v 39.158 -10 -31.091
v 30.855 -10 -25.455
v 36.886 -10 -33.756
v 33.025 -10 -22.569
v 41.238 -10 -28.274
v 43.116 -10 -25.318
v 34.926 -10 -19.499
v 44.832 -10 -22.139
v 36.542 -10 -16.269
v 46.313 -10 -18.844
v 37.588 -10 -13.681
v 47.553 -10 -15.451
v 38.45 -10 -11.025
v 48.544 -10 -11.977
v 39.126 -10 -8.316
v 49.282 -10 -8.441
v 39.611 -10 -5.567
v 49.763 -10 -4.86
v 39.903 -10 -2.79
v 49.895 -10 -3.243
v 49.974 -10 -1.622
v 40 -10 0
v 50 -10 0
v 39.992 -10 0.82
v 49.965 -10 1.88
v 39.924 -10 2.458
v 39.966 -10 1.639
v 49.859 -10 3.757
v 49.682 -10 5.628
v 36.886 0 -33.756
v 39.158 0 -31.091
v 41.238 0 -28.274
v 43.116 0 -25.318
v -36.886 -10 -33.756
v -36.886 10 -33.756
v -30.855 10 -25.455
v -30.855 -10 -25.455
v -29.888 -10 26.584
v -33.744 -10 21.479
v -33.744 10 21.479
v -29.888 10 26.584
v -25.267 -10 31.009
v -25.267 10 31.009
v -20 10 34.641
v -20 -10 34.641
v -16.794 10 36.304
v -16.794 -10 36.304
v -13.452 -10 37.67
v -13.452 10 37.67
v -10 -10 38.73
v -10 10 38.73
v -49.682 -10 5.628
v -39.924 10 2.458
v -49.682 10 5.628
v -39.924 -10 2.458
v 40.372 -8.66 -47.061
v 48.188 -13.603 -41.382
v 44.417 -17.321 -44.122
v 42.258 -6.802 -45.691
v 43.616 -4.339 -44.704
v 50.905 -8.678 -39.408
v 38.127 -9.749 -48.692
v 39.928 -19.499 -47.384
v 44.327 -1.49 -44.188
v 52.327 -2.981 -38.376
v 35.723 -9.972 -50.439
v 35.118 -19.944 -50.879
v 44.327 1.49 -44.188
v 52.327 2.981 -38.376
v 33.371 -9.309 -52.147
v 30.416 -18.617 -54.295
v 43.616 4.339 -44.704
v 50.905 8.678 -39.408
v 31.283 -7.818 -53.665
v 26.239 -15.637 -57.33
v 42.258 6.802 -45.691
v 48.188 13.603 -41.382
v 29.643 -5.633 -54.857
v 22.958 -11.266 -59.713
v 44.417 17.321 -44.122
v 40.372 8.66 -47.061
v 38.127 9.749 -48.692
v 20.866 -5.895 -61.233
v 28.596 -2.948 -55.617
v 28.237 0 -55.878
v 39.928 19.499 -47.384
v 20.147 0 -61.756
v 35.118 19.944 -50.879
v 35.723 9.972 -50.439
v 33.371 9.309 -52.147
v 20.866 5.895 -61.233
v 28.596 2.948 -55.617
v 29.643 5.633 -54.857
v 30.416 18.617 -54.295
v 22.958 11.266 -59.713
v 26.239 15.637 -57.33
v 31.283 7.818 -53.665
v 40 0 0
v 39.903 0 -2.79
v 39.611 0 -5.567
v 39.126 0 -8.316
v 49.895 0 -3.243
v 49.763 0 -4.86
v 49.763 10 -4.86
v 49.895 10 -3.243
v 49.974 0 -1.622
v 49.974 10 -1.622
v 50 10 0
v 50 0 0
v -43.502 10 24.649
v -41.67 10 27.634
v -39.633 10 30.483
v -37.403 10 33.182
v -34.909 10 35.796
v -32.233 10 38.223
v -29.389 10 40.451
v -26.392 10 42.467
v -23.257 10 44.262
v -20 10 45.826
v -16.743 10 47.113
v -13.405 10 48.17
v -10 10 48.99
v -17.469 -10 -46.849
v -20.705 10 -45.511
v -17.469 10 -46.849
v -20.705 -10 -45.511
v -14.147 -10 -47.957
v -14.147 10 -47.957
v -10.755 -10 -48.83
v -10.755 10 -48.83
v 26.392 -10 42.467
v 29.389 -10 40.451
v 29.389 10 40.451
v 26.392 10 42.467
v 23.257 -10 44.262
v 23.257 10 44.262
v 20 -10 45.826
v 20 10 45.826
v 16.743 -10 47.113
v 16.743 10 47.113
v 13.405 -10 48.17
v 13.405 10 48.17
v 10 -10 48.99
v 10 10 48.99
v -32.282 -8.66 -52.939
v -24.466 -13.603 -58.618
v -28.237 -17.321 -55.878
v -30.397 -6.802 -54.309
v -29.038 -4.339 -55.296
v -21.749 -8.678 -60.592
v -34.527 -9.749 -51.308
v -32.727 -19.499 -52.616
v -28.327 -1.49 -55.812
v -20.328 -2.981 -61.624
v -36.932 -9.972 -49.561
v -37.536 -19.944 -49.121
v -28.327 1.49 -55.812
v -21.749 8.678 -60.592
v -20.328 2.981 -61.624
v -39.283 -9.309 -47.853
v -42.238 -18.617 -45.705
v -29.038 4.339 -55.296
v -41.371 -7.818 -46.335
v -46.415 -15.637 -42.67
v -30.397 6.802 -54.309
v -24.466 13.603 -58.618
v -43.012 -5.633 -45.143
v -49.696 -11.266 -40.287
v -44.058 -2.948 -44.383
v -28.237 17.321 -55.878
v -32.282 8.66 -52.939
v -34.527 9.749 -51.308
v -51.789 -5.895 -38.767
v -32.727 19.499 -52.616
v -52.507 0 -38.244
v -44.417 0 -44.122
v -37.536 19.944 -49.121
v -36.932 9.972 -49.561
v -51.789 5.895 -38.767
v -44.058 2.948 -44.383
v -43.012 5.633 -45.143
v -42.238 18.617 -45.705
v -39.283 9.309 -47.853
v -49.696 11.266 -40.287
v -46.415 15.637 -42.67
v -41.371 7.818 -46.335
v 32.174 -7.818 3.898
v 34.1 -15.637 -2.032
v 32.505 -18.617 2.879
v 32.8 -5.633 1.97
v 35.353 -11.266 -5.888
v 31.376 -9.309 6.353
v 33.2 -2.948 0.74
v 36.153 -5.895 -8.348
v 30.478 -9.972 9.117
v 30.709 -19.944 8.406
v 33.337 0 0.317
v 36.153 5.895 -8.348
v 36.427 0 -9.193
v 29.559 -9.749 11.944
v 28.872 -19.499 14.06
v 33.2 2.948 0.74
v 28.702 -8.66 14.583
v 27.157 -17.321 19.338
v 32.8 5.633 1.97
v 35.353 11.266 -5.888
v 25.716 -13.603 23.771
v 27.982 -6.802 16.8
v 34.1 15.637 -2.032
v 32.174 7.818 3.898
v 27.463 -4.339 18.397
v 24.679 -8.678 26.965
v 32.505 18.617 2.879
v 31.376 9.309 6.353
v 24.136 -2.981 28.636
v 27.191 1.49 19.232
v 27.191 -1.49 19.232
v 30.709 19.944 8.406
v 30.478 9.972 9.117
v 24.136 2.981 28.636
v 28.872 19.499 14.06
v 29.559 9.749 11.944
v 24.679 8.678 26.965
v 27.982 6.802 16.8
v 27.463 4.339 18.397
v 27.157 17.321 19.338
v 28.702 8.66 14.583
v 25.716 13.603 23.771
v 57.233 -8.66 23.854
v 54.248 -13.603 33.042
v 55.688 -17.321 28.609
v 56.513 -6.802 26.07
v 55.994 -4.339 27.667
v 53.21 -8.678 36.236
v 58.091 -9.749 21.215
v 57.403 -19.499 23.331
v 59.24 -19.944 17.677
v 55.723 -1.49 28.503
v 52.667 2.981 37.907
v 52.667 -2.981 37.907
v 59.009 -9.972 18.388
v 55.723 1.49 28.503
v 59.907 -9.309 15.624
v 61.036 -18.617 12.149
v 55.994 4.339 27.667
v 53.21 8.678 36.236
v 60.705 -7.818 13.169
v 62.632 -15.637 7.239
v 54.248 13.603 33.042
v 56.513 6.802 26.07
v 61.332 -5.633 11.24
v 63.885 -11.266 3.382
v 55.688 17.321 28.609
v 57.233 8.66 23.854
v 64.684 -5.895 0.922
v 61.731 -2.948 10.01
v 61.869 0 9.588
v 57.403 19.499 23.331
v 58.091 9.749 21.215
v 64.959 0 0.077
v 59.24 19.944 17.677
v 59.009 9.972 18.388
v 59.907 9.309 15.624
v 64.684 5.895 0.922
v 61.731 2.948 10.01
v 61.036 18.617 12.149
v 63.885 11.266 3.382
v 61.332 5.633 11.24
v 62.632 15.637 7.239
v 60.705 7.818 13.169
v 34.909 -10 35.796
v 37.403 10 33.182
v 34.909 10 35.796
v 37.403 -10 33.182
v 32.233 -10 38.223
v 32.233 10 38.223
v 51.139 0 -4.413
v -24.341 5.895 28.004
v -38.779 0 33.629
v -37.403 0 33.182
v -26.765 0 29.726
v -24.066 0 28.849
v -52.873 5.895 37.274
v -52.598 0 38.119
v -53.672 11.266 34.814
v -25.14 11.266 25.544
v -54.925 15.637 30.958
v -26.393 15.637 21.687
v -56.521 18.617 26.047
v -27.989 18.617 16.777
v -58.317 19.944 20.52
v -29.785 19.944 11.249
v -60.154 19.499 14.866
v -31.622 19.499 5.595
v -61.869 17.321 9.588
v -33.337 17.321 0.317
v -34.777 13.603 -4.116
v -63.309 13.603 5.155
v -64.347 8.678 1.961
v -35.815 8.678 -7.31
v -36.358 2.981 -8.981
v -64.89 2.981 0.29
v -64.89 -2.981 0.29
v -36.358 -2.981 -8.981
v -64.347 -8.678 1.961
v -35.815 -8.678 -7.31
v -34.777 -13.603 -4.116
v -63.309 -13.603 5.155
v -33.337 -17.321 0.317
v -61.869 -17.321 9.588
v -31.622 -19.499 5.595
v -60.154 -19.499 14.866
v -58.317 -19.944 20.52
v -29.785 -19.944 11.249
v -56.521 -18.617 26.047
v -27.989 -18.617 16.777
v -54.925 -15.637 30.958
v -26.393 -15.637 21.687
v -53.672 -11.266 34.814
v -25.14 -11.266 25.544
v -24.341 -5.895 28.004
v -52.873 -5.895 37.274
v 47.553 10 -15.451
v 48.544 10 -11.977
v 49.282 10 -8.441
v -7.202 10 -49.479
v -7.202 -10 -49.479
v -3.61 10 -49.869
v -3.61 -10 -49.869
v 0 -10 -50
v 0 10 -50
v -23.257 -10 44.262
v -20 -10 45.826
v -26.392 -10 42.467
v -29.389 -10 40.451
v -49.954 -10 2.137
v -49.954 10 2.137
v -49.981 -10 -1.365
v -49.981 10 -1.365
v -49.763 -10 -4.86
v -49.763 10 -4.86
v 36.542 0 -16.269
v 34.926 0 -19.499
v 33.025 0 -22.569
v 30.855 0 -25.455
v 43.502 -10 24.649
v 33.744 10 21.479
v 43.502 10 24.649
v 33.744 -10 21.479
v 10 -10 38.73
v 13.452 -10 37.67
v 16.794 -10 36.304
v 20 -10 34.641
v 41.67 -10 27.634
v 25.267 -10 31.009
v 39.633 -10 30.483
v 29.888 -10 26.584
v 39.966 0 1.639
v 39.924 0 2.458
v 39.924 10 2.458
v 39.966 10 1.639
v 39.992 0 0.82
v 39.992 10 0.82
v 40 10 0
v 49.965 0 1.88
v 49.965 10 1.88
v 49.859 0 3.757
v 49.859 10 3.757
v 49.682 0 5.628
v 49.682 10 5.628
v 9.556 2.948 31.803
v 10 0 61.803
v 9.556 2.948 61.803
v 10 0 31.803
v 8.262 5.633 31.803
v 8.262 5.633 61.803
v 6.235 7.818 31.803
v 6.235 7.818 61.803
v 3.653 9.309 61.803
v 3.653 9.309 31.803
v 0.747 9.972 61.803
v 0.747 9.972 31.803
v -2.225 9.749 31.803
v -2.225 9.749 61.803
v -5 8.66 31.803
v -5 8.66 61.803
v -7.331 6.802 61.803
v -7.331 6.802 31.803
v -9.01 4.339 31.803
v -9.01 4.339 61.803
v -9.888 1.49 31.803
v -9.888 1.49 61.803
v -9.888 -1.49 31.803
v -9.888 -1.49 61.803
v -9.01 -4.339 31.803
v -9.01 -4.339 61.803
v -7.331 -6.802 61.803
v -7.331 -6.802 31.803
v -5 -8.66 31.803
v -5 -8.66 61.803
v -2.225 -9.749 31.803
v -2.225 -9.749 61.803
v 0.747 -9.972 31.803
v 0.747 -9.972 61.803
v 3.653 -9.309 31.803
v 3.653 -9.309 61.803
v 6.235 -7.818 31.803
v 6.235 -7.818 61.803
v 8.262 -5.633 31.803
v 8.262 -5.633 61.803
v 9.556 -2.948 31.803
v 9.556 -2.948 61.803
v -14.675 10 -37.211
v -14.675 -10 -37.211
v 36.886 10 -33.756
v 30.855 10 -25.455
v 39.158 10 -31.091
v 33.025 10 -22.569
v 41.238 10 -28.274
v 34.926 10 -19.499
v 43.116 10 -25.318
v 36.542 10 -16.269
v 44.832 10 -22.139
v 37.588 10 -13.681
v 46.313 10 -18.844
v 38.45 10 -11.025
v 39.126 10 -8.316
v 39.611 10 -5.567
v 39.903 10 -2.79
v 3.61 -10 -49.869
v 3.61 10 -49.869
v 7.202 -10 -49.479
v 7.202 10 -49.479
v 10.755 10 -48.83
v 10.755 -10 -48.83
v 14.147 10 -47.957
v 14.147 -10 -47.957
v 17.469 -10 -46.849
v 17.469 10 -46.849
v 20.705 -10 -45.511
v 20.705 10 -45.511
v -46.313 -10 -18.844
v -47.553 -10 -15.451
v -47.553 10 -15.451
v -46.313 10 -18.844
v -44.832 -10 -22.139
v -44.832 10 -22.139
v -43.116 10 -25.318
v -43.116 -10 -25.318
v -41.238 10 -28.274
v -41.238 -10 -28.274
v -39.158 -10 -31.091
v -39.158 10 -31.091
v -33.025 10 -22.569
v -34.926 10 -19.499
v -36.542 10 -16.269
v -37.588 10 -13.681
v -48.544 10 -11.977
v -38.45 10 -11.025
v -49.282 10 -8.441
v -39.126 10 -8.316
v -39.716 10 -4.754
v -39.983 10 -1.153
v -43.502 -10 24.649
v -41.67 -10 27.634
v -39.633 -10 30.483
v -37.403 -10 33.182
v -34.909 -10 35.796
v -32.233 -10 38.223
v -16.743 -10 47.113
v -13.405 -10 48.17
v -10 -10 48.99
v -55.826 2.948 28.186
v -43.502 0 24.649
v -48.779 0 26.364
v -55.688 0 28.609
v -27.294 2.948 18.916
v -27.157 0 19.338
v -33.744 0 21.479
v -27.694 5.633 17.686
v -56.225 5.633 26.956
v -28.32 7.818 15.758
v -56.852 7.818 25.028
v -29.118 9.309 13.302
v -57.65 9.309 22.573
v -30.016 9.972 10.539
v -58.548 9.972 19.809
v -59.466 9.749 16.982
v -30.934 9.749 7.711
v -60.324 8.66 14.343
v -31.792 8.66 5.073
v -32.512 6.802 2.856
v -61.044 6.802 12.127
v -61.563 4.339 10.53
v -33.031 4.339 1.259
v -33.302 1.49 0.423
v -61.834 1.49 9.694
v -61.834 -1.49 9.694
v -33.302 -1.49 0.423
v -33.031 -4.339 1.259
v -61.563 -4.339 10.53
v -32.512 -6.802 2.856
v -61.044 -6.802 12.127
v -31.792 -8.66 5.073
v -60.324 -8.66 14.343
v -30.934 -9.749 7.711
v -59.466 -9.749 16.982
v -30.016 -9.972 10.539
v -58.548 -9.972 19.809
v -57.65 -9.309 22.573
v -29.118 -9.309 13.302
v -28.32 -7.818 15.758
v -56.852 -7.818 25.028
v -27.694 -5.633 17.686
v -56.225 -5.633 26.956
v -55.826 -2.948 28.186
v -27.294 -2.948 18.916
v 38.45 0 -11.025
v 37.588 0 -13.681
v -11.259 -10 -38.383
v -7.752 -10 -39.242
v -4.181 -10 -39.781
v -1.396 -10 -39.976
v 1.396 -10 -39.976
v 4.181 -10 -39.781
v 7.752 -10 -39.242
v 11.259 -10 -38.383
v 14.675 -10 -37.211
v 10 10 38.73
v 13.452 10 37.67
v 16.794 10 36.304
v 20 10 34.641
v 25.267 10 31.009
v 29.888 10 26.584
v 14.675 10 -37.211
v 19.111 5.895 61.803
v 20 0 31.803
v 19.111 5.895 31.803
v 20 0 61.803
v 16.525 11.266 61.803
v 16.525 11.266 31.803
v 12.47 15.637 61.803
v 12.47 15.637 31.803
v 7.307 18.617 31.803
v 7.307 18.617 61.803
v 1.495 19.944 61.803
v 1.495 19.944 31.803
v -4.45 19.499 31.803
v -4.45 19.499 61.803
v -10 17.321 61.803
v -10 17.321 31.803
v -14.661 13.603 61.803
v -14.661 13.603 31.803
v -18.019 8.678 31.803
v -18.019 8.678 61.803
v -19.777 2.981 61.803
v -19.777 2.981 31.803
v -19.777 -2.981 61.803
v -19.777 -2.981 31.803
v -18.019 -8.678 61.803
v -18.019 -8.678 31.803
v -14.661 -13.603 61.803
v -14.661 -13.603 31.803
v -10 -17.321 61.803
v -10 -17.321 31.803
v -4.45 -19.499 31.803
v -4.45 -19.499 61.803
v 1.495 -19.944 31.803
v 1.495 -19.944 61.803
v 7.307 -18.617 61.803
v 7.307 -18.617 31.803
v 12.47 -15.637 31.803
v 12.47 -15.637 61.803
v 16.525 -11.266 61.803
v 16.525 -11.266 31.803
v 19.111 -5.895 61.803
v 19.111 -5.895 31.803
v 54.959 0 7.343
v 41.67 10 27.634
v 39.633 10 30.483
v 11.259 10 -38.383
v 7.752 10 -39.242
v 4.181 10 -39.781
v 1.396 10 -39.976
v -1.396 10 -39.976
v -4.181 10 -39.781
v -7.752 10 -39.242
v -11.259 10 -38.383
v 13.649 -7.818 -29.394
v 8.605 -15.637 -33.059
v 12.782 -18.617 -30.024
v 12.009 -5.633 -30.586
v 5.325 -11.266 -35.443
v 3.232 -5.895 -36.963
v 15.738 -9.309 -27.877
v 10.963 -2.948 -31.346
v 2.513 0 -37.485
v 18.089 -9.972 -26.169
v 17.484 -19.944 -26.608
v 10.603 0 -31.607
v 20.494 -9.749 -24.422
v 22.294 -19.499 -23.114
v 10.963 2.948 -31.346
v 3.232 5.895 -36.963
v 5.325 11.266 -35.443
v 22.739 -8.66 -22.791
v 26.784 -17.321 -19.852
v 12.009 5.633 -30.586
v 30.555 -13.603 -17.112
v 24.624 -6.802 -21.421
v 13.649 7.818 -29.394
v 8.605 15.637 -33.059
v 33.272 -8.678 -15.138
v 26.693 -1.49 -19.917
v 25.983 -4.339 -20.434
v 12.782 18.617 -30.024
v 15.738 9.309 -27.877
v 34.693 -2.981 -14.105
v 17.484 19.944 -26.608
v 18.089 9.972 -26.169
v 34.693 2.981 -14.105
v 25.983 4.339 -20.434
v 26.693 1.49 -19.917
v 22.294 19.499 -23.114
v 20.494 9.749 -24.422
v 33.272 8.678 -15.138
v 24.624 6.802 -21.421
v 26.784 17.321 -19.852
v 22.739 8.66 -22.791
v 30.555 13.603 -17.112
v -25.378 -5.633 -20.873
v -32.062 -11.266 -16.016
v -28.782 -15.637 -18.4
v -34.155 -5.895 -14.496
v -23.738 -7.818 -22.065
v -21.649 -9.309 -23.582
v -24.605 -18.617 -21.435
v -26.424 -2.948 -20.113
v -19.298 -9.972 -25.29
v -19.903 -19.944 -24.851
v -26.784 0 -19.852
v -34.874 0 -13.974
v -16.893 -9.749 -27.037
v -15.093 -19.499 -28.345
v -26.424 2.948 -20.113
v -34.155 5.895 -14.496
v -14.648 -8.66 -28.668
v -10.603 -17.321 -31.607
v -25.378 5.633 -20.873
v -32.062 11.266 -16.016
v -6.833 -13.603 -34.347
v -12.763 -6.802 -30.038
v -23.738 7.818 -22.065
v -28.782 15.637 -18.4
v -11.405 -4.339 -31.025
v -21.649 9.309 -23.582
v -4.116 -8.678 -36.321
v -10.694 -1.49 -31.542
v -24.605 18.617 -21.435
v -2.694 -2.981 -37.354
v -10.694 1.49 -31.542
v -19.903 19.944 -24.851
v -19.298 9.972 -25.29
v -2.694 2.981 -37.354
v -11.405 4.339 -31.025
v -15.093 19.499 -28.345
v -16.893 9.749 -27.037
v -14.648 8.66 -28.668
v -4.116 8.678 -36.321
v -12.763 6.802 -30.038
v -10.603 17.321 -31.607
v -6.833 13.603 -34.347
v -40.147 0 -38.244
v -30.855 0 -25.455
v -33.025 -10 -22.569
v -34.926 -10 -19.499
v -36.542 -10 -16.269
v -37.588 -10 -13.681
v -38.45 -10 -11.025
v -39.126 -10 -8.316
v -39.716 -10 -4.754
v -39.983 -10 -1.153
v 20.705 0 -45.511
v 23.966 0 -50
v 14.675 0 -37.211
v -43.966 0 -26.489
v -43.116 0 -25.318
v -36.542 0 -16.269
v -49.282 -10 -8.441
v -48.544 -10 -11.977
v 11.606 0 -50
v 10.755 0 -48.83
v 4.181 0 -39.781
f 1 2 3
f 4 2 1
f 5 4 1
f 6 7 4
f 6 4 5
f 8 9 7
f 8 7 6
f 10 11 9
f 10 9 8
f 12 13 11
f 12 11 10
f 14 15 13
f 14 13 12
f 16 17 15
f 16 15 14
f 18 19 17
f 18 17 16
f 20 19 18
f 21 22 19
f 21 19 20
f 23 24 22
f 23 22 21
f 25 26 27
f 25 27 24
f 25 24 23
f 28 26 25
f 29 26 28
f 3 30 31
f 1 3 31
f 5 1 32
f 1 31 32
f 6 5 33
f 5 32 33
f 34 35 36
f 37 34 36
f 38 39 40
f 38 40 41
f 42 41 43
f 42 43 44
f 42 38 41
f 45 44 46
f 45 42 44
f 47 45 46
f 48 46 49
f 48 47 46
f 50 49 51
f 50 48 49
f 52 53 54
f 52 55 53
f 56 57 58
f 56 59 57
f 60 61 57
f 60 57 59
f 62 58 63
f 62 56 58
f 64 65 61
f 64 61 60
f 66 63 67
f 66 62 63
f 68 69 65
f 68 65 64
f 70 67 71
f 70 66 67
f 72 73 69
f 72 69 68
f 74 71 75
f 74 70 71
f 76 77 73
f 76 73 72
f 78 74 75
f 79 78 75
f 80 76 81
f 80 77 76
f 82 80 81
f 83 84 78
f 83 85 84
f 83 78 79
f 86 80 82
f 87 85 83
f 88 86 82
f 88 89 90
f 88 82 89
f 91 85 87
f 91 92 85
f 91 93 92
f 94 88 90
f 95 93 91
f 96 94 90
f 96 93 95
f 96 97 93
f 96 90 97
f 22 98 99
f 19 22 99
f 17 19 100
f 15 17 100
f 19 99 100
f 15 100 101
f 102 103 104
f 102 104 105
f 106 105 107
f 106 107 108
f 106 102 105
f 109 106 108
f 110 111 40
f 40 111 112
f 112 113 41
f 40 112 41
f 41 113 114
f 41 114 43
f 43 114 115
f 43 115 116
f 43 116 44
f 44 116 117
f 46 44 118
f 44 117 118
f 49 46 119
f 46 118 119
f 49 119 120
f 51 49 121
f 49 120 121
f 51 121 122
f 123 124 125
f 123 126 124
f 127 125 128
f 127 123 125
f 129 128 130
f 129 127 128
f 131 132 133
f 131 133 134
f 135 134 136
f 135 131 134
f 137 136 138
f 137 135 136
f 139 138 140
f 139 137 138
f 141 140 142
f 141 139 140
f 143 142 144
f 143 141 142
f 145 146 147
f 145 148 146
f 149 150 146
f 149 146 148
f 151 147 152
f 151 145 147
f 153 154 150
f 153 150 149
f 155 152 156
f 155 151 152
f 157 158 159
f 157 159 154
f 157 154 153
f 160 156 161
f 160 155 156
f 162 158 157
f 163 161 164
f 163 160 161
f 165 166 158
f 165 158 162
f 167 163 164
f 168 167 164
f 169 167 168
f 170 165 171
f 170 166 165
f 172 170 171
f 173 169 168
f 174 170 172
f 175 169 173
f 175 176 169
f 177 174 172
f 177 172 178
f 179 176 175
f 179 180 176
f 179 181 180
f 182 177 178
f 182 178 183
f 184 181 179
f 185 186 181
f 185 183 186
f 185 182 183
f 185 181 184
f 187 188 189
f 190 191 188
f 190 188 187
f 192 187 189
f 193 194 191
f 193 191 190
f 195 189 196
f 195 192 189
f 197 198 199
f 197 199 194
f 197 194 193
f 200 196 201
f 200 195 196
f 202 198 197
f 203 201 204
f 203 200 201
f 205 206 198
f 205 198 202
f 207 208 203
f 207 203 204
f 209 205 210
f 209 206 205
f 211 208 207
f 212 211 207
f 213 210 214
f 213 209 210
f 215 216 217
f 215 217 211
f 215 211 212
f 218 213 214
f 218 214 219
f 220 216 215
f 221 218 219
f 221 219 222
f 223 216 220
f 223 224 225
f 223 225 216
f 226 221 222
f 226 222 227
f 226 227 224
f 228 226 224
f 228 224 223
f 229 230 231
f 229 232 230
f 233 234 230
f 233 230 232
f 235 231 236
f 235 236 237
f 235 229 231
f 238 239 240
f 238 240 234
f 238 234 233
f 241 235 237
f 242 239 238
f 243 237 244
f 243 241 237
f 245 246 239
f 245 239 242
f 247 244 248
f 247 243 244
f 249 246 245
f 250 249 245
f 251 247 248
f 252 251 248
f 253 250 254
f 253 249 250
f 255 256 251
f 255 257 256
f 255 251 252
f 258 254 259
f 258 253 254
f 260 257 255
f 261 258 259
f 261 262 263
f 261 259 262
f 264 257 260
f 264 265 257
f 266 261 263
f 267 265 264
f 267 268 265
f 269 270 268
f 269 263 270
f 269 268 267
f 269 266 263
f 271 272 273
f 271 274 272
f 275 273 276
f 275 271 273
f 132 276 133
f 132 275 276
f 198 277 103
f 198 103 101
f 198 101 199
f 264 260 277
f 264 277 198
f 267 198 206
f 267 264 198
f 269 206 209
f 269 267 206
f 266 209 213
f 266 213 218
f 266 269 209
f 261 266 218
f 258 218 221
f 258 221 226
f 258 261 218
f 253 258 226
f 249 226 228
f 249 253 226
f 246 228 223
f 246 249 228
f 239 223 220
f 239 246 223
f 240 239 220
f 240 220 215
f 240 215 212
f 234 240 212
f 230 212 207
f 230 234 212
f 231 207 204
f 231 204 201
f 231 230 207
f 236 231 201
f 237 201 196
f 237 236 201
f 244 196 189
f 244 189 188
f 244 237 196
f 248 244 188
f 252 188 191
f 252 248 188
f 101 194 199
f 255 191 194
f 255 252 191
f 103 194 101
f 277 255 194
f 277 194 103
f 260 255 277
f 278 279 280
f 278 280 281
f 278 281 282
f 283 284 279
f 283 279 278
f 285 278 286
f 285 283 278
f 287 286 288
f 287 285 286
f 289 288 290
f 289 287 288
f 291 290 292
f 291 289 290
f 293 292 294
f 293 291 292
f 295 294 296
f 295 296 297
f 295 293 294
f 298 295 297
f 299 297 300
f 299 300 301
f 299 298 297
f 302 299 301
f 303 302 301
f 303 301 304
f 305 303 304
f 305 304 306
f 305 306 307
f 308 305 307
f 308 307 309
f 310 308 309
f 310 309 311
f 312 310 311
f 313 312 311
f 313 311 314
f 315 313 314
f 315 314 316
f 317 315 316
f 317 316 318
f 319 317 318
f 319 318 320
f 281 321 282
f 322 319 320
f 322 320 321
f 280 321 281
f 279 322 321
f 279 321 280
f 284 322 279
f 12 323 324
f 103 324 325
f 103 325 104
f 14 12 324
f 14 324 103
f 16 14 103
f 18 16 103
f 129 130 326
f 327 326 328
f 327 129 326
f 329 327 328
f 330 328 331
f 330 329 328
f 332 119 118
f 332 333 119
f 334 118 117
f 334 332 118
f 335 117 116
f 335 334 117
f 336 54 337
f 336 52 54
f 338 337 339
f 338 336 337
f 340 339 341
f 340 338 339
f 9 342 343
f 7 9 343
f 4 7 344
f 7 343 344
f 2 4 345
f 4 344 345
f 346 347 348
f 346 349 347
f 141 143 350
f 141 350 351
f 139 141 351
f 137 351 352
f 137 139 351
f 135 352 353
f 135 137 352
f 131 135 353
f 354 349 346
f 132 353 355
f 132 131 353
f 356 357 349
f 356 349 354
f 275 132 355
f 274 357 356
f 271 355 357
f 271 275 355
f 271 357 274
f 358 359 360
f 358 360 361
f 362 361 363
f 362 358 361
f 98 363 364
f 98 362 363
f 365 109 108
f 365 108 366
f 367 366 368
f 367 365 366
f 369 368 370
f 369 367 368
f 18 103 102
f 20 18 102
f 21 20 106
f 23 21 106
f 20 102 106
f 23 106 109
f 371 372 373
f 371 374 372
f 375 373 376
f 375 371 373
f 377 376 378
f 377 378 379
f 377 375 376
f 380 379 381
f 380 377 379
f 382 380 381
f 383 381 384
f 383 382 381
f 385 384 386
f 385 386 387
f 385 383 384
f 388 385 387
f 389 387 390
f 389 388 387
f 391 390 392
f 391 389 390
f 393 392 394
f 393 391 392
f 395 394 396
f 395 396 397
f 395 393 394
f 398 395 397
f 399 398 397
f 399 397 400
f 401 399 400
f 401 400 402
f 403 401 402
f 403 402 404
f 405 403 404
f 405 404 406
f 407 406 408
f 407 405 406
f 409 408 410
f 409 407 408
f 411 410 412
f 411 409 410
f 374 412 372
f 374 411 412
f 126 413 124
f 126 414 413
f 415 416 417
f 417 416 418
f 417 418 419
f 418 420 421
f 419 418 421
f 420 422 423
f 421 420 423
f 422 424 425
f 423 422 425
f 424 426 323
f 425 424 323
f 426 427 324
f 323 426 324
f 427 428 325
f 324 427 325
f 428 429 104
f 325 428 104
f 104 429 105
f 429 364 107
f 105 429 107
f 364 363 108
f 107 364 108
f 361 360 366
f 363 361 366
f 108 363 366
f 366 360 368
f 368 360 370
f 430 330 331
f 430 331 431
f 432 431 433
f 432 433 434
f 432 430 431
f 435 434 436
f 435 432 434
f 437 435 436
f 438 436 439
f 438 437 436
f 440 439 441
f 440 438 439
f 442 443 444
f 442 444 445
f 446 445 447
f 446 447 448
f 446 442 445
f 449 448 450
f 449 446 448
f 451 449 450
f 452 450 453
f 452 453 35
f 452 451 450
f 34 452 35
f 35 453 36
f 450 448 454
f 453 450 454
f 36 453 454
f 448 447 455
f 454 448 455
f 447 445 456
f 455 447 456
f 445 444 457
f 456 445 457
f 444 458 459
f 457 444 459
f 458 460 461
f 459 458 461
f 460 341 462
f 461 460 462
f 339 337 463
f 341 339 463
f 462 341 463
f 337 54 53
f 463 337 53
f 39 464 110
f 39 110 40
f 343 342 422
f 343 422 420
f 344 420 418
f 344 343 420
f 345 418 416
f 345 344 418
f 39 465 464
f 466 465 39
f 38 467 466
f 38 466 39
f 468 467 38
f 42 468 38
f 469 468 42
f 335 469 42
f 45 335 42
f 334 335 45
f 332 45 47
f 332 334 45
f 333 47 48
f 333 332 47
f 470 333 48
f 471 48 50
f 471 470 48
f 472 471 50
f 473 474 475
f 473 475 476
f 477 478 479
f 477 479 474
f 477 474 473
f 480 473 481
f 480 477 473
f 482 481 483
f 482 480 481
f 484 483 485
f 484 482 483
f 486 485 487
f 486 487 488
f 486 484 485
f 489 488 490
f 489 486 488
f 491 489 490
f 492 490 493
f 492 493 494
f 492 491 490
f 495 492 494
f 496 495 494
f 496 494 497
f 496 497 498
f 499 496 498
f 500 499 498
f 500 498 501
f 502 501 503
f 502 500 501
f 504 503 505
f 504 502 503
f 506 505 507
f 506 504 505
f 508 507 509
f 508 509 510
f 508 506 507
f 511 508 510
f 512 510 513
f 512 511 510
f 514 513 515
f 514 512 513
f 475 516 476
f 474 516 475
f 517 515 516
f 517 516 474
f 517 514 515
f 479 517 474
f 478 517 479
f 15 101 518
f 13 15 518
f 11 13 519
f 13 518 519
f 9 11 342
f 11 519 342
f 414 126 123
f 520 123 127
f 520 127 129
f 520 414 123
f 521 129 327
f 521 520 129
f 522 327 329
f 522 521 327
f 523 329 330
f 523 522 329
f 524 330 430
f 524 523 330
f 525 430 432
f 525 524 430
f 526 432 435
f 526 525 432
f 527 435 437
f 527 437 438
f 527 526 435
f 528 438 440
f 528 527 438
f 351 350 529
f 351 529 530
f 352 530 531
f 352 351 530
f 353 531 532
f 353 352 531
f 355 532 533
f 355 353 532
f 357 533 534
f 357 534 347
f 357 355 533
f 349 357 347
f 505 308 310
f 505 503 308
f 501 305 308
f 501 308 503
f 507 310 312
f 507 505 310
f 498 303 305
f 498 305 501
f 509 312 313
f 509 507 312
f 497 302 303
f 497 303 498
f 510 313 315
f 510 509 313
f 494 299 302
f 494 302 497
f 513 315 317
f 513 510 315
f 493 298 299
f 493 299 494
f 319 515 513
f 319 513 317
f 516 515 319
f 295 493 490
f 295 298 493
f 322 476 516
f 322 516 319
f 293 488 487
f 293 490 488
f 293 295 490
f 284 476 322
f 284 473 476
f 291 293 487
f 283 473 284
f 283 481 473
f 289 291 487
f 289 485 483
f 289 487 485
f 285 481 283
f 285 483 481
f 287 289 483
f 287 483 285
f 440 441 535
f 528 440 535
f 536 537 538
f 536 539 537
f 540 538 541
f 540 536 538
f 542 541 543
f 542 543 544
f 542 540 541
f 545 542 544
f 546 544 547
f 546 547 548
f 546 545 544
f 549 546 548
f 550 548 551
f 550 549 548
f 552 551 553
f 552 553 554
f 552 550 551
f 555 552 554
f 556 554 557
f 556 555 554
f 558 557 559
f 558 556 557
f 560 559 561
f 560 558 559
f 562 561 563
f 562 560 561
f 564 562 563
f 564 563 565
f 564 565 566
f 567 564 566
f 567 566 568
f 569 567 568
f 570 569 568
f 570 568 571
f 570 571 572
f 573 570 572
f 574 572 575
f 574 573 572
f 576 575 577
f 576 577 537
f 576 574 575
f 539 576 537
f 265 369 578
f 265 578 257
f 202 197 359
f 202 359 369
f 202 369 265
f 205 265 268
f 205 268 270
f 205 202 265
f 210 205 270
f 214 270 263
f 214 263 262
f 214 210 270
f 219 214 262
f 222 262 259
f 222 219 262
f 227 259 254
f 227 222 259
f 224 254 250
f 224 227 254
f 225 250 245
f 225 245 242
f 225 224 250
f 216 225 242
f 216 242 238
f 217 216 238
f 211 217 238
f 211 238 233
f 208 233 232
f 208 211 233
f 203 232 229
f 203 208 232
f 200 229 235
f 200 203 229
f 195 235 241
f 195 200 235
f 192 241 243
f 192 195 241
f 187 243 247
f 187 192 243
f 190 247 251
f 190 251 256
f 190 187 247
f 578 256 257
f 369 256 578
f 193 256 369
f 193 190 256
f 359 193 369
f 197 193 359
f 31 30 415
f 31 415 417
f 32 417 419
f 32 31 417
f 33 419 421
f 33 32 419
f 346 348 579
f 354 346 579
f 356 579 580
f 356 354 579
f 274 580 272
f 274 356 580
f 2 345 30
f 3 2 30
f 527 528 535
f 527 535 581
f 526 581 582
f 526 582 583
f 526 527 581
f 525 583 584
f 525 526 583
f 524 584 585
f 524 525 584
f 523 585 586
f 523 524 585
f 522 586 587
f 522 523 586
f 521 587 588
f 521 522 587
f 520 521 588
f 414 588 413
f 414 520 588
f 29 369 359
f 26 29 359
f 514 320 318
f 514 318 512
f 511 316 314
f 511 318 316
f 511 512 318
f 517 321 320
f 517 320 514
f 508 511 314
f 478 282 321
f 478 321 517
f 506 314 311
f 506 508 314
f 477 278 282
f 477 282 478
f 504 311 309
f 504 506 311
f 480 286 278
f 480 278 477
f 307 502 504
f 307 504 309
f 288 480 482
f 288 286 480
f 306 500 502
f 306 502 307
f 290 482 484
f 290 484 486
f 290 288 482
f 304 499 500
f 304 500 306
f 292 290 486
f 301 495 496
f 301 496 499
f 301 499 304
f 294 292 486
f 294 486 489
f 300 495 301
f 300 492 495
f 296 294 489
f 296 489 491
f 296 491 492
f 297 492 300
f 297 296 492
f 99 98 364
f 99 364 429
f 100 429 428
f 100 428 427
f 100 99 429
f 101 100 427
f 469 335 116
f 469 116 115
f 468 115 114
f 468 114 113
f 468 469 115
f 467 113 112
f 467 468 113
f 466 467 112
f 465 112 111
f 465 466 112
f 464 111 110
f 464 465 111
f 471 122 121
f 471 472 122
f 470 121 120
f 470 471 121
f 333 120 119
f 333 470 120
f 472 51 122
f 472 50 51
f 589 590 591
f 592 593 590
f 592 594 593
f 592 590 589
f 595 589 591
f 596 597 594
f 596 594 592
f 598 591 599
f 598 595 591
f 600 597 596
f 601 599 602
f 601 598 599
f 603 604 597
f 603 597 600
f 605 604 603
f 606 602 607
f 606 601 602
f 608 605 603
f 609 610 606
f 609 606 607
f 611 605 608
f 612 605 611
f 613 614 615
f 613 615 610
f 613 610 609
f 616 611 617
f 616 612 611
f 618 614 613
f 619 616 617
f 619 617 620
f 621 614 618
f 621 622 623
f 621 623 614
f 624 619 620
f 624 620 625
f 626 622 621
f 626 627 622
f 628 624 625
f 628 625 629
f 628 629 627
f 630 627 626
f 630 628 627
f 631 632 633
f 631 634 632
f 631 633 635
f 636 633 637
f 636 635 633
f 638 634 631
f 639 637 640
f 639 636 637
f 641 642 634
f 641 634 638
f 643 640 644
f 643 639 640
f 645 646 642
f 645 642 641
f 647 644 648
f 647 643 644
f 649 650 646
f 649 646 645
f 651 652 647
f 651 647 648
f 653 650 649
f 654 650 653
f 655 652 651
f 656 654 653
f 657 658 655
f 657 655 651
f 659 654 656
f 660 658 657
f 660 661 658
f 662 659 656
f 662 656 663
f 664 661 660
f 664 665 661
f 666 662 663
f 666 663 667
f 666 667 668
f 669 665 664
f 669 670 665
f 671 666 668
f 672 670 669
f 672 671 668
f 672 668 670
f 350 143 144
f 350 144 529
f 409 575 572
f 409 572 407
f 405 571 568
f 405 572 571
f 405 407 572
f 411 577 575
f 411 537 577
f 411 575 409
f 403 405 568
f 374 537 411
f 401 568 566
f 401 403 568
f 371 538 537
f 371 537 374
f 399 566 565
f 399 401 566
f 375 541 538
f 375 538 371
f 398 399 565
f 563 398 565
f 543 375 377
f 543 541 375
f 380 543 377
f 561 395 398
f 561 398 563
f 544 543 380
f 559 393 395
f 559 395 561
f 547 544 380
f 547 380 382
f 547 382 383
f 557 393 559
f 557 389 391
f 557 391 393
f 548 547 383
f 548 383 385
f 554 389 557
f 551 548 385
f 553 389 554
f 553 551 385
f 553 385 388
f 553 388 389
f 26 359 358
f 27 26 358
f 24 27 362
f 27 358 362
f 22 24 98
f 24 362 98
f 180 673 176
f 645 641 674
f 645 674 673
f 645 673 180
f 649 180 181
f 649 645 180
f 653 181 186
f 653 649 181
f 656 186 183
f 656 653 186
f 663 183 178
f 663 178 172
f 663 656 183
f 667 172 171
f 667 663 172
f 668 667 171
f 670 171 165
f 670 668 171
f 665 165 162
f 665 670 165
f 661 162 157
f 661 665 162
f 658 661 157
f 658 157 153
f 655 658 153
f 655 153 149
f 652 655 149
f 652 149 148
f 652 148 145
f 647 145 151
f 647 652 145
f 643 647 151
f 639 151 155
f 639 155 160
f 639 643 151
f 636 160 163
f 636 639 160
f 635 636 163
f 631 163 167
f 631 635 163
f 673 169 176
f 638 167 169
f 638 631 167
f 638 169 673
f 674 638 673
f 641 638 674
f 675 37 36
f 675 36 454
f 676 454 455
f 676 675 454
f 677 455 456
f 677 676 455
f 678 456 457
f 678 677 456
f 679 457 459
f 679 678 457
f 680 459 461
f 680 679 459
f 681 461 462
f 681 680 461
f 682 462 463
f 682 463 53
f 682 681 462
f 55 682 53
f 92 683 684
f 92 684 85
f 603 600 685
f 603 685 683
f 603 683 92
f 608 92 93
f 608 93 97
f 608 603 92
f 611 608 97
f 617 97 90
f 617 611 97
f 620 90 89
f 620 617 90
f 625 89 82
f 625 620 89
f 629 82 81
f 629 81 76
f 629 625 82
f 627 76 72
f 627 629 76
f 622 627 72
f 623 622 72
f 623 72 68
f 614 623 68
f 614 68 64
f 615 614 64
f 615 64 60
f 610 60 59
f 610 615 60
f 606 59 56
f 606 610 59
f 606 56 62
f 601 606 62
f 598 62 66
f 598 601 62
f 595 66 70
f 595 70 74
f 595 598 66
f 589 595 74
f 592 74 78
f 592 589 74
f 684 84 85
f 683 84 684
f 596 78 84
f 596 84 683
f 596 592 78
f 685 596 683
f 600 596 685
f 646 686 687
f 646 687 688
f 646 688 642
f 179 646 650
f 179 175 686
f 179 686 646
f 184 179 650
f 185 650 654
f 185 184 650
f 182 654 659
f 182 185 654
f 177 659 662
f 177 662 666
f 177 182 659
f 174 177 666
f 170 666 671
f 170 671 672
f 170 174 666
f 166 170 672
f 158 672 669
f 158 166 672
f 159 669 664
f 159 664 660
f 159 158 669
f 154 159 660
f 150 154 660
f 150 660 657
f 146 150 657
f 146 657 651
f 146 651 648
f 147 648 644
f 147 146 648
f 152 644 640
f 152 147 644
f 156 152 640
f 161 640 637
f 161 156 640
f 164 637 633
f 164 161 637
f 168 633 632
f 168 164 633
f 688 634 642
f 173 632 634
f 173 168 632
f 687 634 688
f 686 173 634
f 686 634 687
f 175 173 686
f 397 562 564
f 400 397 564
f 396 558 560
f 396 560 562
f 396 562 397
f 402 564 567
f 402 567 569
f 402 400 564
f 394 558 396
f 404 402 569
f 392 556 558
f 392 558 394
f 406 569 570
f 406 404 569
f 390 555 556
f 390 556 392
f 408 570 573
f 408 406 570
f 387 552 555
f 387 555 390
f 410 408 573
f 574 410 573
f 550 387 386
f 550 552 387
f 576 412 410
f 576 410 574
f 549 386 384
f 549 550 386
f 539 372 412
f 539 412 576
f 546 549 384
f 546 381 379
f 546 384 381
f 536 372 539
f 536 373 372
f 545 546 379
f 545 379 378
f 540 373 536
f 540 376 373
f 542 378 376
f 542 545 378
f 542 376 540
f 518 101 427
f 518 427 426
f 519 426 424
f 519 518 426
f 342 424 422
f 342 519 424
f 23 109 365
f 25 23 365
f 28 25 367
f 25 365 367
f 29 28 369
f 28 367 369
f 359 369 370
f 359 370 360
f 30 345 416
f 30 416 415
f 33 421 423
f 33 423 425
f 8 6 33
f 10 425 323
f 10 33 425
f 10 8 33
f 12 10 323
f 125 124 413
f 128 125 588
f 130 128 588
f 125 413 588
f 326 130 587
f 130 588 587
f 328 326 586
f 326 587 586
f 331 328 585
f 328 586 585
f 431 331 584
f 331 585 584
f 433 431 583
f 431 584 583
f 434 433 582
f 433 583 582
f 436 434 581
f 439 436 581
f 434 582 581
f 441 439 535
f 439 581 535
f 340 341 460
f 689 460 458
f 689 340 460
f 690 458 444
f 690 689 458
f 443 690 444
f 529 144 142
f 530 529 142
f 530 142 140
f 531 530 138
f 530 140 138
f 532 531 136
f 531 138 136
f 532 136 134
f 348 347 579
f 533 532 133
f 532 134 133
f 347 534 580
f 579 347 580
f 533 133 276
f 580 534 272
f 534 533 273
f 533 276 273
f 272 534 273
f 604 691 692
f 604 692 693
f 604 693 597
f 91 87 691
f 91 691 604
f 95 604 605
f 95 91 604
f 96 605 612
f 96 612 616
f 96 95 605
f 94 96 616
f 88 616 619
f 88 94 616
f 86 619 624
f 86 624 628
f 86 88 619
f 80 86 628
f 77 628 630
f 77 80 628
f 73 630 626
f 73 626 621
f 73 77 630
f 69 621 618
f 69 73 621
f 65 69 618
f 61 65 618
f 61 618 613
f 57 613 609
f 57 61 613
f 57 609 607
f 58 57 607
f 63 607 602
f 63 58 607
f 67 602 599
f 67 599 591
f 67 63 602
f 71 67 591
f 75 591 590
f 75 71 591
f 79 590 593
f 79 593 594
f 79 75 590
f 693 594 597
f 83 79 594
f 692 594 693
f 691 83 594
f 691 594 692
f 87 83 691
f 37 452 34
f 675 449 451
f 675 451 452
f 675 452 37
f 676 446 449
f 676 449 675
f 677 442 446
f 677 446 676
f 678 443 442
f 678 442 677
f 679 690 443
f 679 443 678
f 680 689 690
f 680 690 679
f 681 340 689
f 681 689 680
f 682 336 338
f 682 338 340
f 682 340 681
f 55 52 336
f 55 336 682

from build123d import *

# Parameters (mm, degrees)
F6_DEPTH = 10


with BuildPart() as f1:
    # F0 (on Front) → F1 (revolve)
    with BuildSketch(Plane.XZ):
        Polygon((10, 61.803398875), (10, 54.5379735949), (20, 47.2725483149), (20, 61.803398875), align=None)
        with BuildLine():
            Line((20, 47.2725483149), (10, 54.5379735949))
            Line((10, 54.5379735949), (10, 48.9897948557))
            ThreePointArc((10, 48.9897948557), (15.0831954164, 47.6707165462), (20, 45.8257569496))
            Line((20, 45.8257569496), (20, 47.2725483149))
        make_face()
        with BuildLine():
            ThreePointArc((20, 45.8257569496), (15.0831954164, 47.6707165462), (10, 48.9897948557))
            Line((10, 48.9897948557), (10, 38.7298334621))
            ThreePointArc((10, 38.7298334621), (15.1386791613, 37.0245917364), (20, 34.6410161514))
            Line((20, 34.6410161514), (20, 45.8257569496))
        make_face()
        with BuildLine():
            ThreePointArc((20, 34.6410161514), (15.1386791613, 37.0245917364), (10, 38.7298334621))
            Line((10, 38.7298334621), (10, 31.803398875))
            Line((10, 31.803398875), (20, 31.803398875))
            Line((20, 31.803398875), (20, 34.6410161514))
        make_face()
    revolve(axis=Axis((0, 0, 30.9016994375), (0, 0, 1)))


with BuildPart() as f2:
    # F0 (on Front) → F2 (revolve)
    with BuildSketch(Plane.XZ):
        Polygon((61.868695173, 9.5877353996), (54.9588651167, 7.3425955167), (51.1392050042, -4.4131095292), (64.9588651167, 0.0771702366), align=None)
        with BuildLine():
            Line((54.9588651167, 7.3425955167), (49.6822335732, 5.6281139984))
            ThreePointArc((49.6822335732, 5.6281139984), (49.9204951831, 2.8185387473), (50, 0))
            ThreePointArc((50, 0), (49.9407710815, -2.4329783778), (49.7632246485, -4.8601926484))
            Line((49.7632246485, -4.8601926484), (51.1392050042, -4.4131095292))
            Line((51.1392050042, -4.4131095292), (54.9588651167, 7.3425955167))
        make_face()
        with BuildLine():
            ThreePointArc((50, 0), (49.9204951831, 2.8185387473), (49.6822335732, 5.6281139984))
            Line((49.6822335732, 5.6281139984), (39.9244304329, 2.4576115661))
            ThreePointArc((39.9244304329, 2.4576115661), (39.9811031446, 1.2293865716), (40, 0))
            ThreePointArc((40, 0), (39.7808758147, -4.1811385307), (39.1259040294, -8.3164676327))
            Line((39.1259040294, -8.3164676327), (49.7632246485, -4.8601926484))
            ThreePointArc((49.7632246485, -4.8601926484), (49.9407710815, -2.4329783778), (50, 0))
        make_face()
        with BuildLine():
            ThreePointArc((40, 0), (39.9811031446, 1.2293865716), (39.9244304329, 2.4576115661))
            Line((39.9244304329, 2.4576115661), (33.3369996841, 0.3172255683))
            Line((33.3369996841, 0.3172255683), (36.4271696279, -9.1933395946))
            Line((36.4271696279, -9.1933395946), (39.1259040294, -8.3164676327))
            ThreePointArc((39.1259040294, -8.3164676327), (39.7808758147, -4.1811385307), (40, 0))
        make_face()
    revolve(axis=Axis((29.3892626146, 0, 9.5491502813), (0.9510565163, 0, 0.3090169944)))


with BuildPart() as f3:
    # F0 (on Front) → F3 (revolve)
    with BuildSketch(Plane.XZ):
        Polygon((28.2369564565, -55.8778525229), (23.9664466253, -50), (11.6057668503, -50), (20.1467865128, -61.7557050458), align=None)
        with BuildLine():
            Line((23.9664466253, -50), (20.7053089852, -45.5114291121))
            ThreePointArc((20.7053089852, -45.5114291121), (15.8175827308, -47.4320996431), (10.7553642226, -48.8295211981))
            Line((10.7553642226, -48.8295211981), (11.6057668503, -50))
            Line((11.6057668503, -50), (23.9664466253, -50))
        make_face()
        with BuildLine():
            ThreePointArc((10.7553642226, -48.8295211981), (15.8175827308, -47.4320996431), (20.7053089852, -45.5114291121))
            Line((20.7053089852, -45.5114291121), (14.674654989, -37.2109459831))
            ThreePointArc((14.674654989, -37.2109459831), (9.5150602809, -38.8518162748), (4.1811385307, -39.7808758147))
            Line((4.1811385307, -39.7808758147), (10.7553642226, -48.8295211981))
        make_face()
        with BuildLine():
            ThreePointArc((4.1811385307, -39.7808758147), (9.5150602809, -38.8518162748), (14.674654989, -37.2109459831))
            Line((14.674654989, -37.2109459831), (10.6033988877, -31.6073426917))
            Line((10.6033988877, -31.6073426917), (2.513228944, -37.4851952146))
            Line((2.513228944, -37.4851952146), (4.1811385307, -39.7808758147))
        make_face()
    revolve(axis=Axis((18.1635632001, 0, -25), (0.5877852523, 0, -0.8090169944)))


with BuildPart() as f4:
    # F0 (on Front) → F4 (revolve)
    with BuildSketch(Plane.XZ):
        with BuildLine():
            Line((-36.5418183057, -16.269465723), (-43.1160439976, -25.3181111064))
            ThreePointArc((-43.1160439976, -25.3181111064), (-40.2227055734, -29.7007399968), (-36.8856488727, -33.7557240662))
            Line((-36.8856488727, -33.7557240662), (-30.8549948765, -25.4552409372))
            ThreePointArc((-30.8549948765, -25.4552409372), (-34.0099577087, -21.0552315743), (-36.5418183057, -16.269465723))
        make_face()
        with BuildLine():
            Line((-34.873908719, -13.9737851229), (-36.5418183057, -16.269465723))
            ThreePointArc((-36.5418183057, -16.269465723), (-34.0099577087, -21.0552315743), (-30.8549948765, -25.4552409372))
            Line((-30.8549948765, -25.4552409372), (-26.7837387752, -19.8516376458))
            Line((-26.7837387752, -19.8516376458), (-34.873908719, -13.9737851229))
        make_face()
        with BuildLine():
            Line((-43.1160439976, -25.3181111064), (-43.9664466253, -26.4885899083))
            Line((-43.9664466253, -26.4885899083), (-40.1467865128, -38.2442949542))
            Line((-40.1467865128, -38.2442949542), (-36.8856488727, -33.7557240662))
            ThreePointArc((-36.8856488727, -33.7557240662), (-40.2227055734, -29.7007399968), (-43.1160439976, -25.3181111064))
        make_face()
        Polygon((-40.1467865128, -38.2442949542), (-43.9664466253, -26.4885899083), (-52.5074662878, -38.2442949542), (-44.417296344, -44.1221474771), align=None)
    revolve(axis=Axis((-18.1635632001, 0, -25), (-0.5877852523, 0, -0.8090169944)))


with BuildPart() as f5:
    # F0 (on Front) → F5 (revolve)
    with BuildSketch(Plane.XZ):
        Polygon((-48.7785252292, 26.3637258426), (-38.7785252292, 33.6291511226), (-52.5981853417, 38.1194308884), (-55.6883552855, 28.6088657255), align=None)
        with BuildLine():
            Line((-37.4025448735, 33.1820680034), (-38.7785252292, 33.6291511226))
            Line((-38.7785252292, 33.6291511226), (-48.7785252292, 26.3637258426))
            Line((-48.7785252292, 26.3637258426), (-43.5018936857, 24.6492443243))
            ThreePointArc((-43.5018936857, 24.6492443243), (-40.6765818946, 29.0760328341), (-37.4025448735, 33.1820680034))
        make_face()
        with BuildLine():
            Line((-26.7652242544, 29.7257930191), (-37.4025448735, 33.1820680034))
            ThreePointArc((-37.4025448735, 33.1820680034), (-40.6765818946, 29.0760328341), (-43.5018936857, 24.6492443243))
            Line((-43.5018936857, 24.6492443243), (-33.7440905454, 21.478741892))
            ThreePointArc((-33.7440905454, 21.478741892), (-30.5343701009, 25.8389675209), (-26.7652242544, 29.7257930191))
        make_face()
        with BuildLine():
            Line((-24.0664898529, 28.8489210572), (-26.7652242544, 29.7257930191))
            ThreePointArc((-26.7652242544, 29.7257930191), (-30.5343701009, 25.8389675209), (-33.7440905454, 21.478741892))
            Line((-33.7440905454, 21.478741892), (-27.1566597966, 19.3383558942))
            Line((-27.1566597966, 19.3383558942), (-24.0664898529, 28.8489210572))
        make_face()
    revolve(axis=Axis((-29.3892626146, 0, 9.5491502813), (-0.9510565163, 0, 0.3090169944)))


with BuildPart() as f6:
    # F0 (on Front) → F6 (new body, symmetric)
    with BuildSketch(Plane.XZ):
        with BuildLine():
            ThreePointArc((-20, 45.8257569496), (-24.8404351768, 43.3930038166), (-29.3892625184, 40.4508497887))
            ThreePointArc((-29.3892625184, 40.4508497887), (-33.5930823359, 37.0338334388), (-37.4025448735, 33.1820680034))
            Line((-37.4025448735, 33.1820680034), (-26.7652242544, 29.7257930191))
            ThreePointArc((-26.7652242544, 29.7257930191), (-23.5114100917, 32.360679775), (-20, 34.6410161514))
            Line((-20, 34.6410161514), (-20, 45.8257569496))
        make_face()
        with BuildLine():
            Line((-10, 38.7298334621), (-10, 48.9897948557))
            ThreePointArc((-10, 48.9897948557), (-15.0831954163, 47.6707165462), (-20, 45.8257569496))
            Line((-20, 45.8257569496), (-20, 34.6410161514))
            ThreePointArc((-20, 34.6410161514), (-15.1386791613, 37.0245917364), (-10, 38.7298334621))
        make_face()
        with BuildLine():
            Line((-26.7652242544, 29.7257930191), (-37.4025448735, 33.1820680034))
            ThreePointArc((-37.4025448735, 33.1820680034), (-40.6765818946, 29.0760328341), (-43.5018936857, 24.6492443243))
            Line((-43.5018936857, 24.6492443243), (-33.7440905454, 21.478741892))
            ThreePointArc((-33.7440905454, 21.478741892), (-30.5343701009, 25.8389675209), (-26.7652242544, 29.7257930191))
        make_face()
    extrude(amount=F6_DEPTH, both=True)


with BuildPart() as f6b:
    # F0 (on Front) → F6, piece 2 (new body, symmetric)
    with BuildSketch(Plane.XZ):
        with BuildLine():
            ThreePointArc((37.4025448735, 33.1820680034), (33.5930825951, 37.0338332037), (29.3892630845, 40.4508493774))
            ThreePointArc((29.3892630845, 40.4508493774), (24.8404354805, 43.3930036428), (20, 45.8257569496))
            Line((20, 45.8257569496), (20, 34.6410161514))
            ThreePointArc((20, 34.6410161514), (23.5114100917, 32.360679775), (26.7652242544, 29.7257930191))
            Line((26.7652242544, 29.7257930191), (37.4025448735, 33.1820680034))
        make_face()
        with BuildLine():
            ThreePointArc((43.5018936857, 24.6492443243), (40.6765818946, 29.0760328341), (37.4025448735, 33.1820680034))
            Line((37.4025448735, 33.1820680034), (26.7652242544, 29.7257930191))
            ThreePointArc((26.7652242544, 29.7257930191), (30.5343701009, 25.8389675209), (33.7440905454, 21.478741892))
            Line((33.7440905454, 21.478741892), (43.5018936857, 24.6492443243))
        make_face()
        with BuildLine():
            ThreePointArc((20, 45.8257569496), (15.0831954164, 47.6707165462), (10, 48.9897948557))
            Line((10, 48.9897948557), (10, 38.7298334621))
            ThreePointArc((10, 38.7298334621), (15.1386791613, 37.0245917364), (20, 34.6410161514))
            Line((20, 34.6410161514), (20, 45.8257569496))
        make_face()
    extrude(amount=F6_DEPTH, both=True)


with BuildPart() as f6c:
    # F0 (on Front) → F6, piece 3 (new body, symmetric)
    with BuildSketch(Plane.XZ):
        with BuildLine():
            ThreePointArc((47.5528259965, -15.4508491594), (48.9453157066, -10.2154818966), (49.7632246485, -4.8601926484))
            Line((49.7632246485, -4.8601926484), (39.1259040294, -8.3164676327))
            ThreePointArc((39.1259040294, -8.3164676327), (38.0422606518, -12.360679775), (36.5418183057, -16.269465723))
            Line((36.5418183057, -16.269465723), (43.1160439976, -25.3181111064))
            ThreePointArc((43.1160439976, -25.3181111064), (45.6021020468, -20.5048357447), (47.5528259965, -15.4508491594))
        make_face()
        with BuildLine():
            ThreePointArc((36.8856488727, -33.7557240662), (40.2227055734, -29.7007399968), (43.1160439976, -25.3181111064))
            Line((43.1160439976, -25.3181111064), (36.5418183057, -16.269465723))
            ThreePointArc((36.5418183057, -16.269465723), (34.0099577087, -21.0552315743), (30.8549948765, -25.4552409372))
            Line((30.8549948765, -25.4552409372), (36.8856488727, -33.7557240662))
        make_face()
        with BuildLine():
            ThreePointArc((50, 0), (49.9204951831, 2.8185387473), (49.6822335732, 5.6281139984))
            Line((49.6822335732, 5.6281139984), (39.9244304329, 2.4576115661))
            ThreePointArc((39.9244304329, 2.4576115661), (39.9811031446, 1.2293865716), (40, 0))
            ThreePointArc((40, 0), (39.7808758147, -4.1811385307), (39.1259040294, -8.3164676327))
            Line((39.1259040294, -8.3164676327), (49.7632246485, -4.8601926484))
            ThreePointArc((49.7632246485, -4.8601926484), (49.9407710815, -2.4329783778), (50, 0))
        make_face()
    extrude(amount=F6_DEPTH, both=True)


with BuildPart() as f6d:
    # F0 (on Front) → F6, piece 4 (new body, symmetric)
    with BuildSketch(Plane.XZ):
        with BuildLine():
            Line((-4.1811385307, -39.7808758147), (-10.7553642226, -48.8295211981))
            ThreePointArc((-10.7553642226, -48.8295211981), (-5.4094334199, -49.7065189897), (2.28e-08, -50))
            ThreePointArc((2.28e-08, -50), (5.4094334425, -49.7065189873), (10.7553642226, -48.8295211981))
            Line((10.7553642226, -48.8295211981), (4.1811385307, -39.7808758147))
            ThreePointArc((4.1811385307, -39.7808758147), (0, -40), (-4.1811385307, -39.7808758147))
        make_face()
        with BuildLine():
            Line((-14.674654989, -37.2109459831), (-20.7053089852, -45.5114291121))
            ThreePointArc((-20.7053089852, -45.5114291121), (-15.8175827308, -47.4320996431), (-10.7553642226, -48.8295211981))
            Line((-10.7553642226, -48.8295211981), (-4.1811385307, -39.7808758147))
            ThreePointArc((-4.1811385307, -39.7808758147), (-9.5150602809, -38.8518162748), (-14.674654989, -37.2109459831))
        make_face()
        with BuildLine():
            ThreePointArc((10.7553642226, -48.8295211981), (15.8175827308, -47.4320996431), (20.7053089852, -45.5114291121))
            Line((20.7053089852, -45.5114291121), (14.674654989, -37.2109459831))
            ThreePointArc((14.674654989, -37.2109459831), (9.5150602809, -38.8518162748), (4.1811385307, -39.7808758147))
            Line((4.1811385307, -39.7808758147), (10.7553642226, -48.8295211981))
        make_face()
    extrude(amount=F6_DEPTH, both=True)


with BuildPart() as f6e:
    # F0 (on Front) → F6, piece 5 (new body, symmetric)
    with BuildSketch(Plane.XZ):
        with BuildLine():
            Line((-39.1259040294, -8.3164676327), (-49.7632246485, -4.8601926484))
            ThreePointArc((-49.7632246485, -4.8601926484), (-48.9453156992, -10.2154819322), (-47.552825974, -15.4508492285))
            ThreePointArc((-47.552825974, -15.4508492285), (-45.6021020319, -20.5048357778), (-43.1160439976, -25.3181111064))
            Line((-43.1160439976, -25.3181111064), (-36.5418183057, -16.269465723))
            ThreePointArc((-36.5418183057, -16.269465723), (-38.0422606518, -12.360679775), (-39.1259040294, -8.3164676327))
        make_face()
        with BuildLine():
            Line((-39.9244304329, 2.4576115661), (-49.6822335732, 5.6281139984))
            ThreePointArc((-49.6822335732, 5.6281139984), (-49.9985093209, 0.3860902595), (-49.7632246485, -4.8601926484))
            Line((-49.7632246485, -4.8601926484), (-39.1259040294, -8.3164676327))
            ThreePointArc((-39.1259040294, -8.3164676327), (-39.8905883674, -2.9565114081), (-39.9244304329, 2.4576115661))
        make_face()
        with BuildLine():
            Line((-36.5418183057, -16.269465723), (-43.1160439976, -25.3181111064))
            ThreePointArc((-43.1160439976, -25.3181111064), (-40.2227055734, -29.7007399968), (-36.8856488727, -33.7557240662))
            Line((-36.8856488727, -33.7557240662), (-30.8549948765, -25.4552409372))
            ThreePointArc((-30.8549948765, -25.4552409372), (-34.0099577087, -21.0552315743), (-36.5418183057, -16.269465723))
        make_face()
    extrude(amount=F6_DEPTH, both=True)


solid = Compound([f1.part, f2.part, f3.part, f4.part, f5.part, f6.part, f6b.part, f6c.part, f6d.part, f6e.part])
